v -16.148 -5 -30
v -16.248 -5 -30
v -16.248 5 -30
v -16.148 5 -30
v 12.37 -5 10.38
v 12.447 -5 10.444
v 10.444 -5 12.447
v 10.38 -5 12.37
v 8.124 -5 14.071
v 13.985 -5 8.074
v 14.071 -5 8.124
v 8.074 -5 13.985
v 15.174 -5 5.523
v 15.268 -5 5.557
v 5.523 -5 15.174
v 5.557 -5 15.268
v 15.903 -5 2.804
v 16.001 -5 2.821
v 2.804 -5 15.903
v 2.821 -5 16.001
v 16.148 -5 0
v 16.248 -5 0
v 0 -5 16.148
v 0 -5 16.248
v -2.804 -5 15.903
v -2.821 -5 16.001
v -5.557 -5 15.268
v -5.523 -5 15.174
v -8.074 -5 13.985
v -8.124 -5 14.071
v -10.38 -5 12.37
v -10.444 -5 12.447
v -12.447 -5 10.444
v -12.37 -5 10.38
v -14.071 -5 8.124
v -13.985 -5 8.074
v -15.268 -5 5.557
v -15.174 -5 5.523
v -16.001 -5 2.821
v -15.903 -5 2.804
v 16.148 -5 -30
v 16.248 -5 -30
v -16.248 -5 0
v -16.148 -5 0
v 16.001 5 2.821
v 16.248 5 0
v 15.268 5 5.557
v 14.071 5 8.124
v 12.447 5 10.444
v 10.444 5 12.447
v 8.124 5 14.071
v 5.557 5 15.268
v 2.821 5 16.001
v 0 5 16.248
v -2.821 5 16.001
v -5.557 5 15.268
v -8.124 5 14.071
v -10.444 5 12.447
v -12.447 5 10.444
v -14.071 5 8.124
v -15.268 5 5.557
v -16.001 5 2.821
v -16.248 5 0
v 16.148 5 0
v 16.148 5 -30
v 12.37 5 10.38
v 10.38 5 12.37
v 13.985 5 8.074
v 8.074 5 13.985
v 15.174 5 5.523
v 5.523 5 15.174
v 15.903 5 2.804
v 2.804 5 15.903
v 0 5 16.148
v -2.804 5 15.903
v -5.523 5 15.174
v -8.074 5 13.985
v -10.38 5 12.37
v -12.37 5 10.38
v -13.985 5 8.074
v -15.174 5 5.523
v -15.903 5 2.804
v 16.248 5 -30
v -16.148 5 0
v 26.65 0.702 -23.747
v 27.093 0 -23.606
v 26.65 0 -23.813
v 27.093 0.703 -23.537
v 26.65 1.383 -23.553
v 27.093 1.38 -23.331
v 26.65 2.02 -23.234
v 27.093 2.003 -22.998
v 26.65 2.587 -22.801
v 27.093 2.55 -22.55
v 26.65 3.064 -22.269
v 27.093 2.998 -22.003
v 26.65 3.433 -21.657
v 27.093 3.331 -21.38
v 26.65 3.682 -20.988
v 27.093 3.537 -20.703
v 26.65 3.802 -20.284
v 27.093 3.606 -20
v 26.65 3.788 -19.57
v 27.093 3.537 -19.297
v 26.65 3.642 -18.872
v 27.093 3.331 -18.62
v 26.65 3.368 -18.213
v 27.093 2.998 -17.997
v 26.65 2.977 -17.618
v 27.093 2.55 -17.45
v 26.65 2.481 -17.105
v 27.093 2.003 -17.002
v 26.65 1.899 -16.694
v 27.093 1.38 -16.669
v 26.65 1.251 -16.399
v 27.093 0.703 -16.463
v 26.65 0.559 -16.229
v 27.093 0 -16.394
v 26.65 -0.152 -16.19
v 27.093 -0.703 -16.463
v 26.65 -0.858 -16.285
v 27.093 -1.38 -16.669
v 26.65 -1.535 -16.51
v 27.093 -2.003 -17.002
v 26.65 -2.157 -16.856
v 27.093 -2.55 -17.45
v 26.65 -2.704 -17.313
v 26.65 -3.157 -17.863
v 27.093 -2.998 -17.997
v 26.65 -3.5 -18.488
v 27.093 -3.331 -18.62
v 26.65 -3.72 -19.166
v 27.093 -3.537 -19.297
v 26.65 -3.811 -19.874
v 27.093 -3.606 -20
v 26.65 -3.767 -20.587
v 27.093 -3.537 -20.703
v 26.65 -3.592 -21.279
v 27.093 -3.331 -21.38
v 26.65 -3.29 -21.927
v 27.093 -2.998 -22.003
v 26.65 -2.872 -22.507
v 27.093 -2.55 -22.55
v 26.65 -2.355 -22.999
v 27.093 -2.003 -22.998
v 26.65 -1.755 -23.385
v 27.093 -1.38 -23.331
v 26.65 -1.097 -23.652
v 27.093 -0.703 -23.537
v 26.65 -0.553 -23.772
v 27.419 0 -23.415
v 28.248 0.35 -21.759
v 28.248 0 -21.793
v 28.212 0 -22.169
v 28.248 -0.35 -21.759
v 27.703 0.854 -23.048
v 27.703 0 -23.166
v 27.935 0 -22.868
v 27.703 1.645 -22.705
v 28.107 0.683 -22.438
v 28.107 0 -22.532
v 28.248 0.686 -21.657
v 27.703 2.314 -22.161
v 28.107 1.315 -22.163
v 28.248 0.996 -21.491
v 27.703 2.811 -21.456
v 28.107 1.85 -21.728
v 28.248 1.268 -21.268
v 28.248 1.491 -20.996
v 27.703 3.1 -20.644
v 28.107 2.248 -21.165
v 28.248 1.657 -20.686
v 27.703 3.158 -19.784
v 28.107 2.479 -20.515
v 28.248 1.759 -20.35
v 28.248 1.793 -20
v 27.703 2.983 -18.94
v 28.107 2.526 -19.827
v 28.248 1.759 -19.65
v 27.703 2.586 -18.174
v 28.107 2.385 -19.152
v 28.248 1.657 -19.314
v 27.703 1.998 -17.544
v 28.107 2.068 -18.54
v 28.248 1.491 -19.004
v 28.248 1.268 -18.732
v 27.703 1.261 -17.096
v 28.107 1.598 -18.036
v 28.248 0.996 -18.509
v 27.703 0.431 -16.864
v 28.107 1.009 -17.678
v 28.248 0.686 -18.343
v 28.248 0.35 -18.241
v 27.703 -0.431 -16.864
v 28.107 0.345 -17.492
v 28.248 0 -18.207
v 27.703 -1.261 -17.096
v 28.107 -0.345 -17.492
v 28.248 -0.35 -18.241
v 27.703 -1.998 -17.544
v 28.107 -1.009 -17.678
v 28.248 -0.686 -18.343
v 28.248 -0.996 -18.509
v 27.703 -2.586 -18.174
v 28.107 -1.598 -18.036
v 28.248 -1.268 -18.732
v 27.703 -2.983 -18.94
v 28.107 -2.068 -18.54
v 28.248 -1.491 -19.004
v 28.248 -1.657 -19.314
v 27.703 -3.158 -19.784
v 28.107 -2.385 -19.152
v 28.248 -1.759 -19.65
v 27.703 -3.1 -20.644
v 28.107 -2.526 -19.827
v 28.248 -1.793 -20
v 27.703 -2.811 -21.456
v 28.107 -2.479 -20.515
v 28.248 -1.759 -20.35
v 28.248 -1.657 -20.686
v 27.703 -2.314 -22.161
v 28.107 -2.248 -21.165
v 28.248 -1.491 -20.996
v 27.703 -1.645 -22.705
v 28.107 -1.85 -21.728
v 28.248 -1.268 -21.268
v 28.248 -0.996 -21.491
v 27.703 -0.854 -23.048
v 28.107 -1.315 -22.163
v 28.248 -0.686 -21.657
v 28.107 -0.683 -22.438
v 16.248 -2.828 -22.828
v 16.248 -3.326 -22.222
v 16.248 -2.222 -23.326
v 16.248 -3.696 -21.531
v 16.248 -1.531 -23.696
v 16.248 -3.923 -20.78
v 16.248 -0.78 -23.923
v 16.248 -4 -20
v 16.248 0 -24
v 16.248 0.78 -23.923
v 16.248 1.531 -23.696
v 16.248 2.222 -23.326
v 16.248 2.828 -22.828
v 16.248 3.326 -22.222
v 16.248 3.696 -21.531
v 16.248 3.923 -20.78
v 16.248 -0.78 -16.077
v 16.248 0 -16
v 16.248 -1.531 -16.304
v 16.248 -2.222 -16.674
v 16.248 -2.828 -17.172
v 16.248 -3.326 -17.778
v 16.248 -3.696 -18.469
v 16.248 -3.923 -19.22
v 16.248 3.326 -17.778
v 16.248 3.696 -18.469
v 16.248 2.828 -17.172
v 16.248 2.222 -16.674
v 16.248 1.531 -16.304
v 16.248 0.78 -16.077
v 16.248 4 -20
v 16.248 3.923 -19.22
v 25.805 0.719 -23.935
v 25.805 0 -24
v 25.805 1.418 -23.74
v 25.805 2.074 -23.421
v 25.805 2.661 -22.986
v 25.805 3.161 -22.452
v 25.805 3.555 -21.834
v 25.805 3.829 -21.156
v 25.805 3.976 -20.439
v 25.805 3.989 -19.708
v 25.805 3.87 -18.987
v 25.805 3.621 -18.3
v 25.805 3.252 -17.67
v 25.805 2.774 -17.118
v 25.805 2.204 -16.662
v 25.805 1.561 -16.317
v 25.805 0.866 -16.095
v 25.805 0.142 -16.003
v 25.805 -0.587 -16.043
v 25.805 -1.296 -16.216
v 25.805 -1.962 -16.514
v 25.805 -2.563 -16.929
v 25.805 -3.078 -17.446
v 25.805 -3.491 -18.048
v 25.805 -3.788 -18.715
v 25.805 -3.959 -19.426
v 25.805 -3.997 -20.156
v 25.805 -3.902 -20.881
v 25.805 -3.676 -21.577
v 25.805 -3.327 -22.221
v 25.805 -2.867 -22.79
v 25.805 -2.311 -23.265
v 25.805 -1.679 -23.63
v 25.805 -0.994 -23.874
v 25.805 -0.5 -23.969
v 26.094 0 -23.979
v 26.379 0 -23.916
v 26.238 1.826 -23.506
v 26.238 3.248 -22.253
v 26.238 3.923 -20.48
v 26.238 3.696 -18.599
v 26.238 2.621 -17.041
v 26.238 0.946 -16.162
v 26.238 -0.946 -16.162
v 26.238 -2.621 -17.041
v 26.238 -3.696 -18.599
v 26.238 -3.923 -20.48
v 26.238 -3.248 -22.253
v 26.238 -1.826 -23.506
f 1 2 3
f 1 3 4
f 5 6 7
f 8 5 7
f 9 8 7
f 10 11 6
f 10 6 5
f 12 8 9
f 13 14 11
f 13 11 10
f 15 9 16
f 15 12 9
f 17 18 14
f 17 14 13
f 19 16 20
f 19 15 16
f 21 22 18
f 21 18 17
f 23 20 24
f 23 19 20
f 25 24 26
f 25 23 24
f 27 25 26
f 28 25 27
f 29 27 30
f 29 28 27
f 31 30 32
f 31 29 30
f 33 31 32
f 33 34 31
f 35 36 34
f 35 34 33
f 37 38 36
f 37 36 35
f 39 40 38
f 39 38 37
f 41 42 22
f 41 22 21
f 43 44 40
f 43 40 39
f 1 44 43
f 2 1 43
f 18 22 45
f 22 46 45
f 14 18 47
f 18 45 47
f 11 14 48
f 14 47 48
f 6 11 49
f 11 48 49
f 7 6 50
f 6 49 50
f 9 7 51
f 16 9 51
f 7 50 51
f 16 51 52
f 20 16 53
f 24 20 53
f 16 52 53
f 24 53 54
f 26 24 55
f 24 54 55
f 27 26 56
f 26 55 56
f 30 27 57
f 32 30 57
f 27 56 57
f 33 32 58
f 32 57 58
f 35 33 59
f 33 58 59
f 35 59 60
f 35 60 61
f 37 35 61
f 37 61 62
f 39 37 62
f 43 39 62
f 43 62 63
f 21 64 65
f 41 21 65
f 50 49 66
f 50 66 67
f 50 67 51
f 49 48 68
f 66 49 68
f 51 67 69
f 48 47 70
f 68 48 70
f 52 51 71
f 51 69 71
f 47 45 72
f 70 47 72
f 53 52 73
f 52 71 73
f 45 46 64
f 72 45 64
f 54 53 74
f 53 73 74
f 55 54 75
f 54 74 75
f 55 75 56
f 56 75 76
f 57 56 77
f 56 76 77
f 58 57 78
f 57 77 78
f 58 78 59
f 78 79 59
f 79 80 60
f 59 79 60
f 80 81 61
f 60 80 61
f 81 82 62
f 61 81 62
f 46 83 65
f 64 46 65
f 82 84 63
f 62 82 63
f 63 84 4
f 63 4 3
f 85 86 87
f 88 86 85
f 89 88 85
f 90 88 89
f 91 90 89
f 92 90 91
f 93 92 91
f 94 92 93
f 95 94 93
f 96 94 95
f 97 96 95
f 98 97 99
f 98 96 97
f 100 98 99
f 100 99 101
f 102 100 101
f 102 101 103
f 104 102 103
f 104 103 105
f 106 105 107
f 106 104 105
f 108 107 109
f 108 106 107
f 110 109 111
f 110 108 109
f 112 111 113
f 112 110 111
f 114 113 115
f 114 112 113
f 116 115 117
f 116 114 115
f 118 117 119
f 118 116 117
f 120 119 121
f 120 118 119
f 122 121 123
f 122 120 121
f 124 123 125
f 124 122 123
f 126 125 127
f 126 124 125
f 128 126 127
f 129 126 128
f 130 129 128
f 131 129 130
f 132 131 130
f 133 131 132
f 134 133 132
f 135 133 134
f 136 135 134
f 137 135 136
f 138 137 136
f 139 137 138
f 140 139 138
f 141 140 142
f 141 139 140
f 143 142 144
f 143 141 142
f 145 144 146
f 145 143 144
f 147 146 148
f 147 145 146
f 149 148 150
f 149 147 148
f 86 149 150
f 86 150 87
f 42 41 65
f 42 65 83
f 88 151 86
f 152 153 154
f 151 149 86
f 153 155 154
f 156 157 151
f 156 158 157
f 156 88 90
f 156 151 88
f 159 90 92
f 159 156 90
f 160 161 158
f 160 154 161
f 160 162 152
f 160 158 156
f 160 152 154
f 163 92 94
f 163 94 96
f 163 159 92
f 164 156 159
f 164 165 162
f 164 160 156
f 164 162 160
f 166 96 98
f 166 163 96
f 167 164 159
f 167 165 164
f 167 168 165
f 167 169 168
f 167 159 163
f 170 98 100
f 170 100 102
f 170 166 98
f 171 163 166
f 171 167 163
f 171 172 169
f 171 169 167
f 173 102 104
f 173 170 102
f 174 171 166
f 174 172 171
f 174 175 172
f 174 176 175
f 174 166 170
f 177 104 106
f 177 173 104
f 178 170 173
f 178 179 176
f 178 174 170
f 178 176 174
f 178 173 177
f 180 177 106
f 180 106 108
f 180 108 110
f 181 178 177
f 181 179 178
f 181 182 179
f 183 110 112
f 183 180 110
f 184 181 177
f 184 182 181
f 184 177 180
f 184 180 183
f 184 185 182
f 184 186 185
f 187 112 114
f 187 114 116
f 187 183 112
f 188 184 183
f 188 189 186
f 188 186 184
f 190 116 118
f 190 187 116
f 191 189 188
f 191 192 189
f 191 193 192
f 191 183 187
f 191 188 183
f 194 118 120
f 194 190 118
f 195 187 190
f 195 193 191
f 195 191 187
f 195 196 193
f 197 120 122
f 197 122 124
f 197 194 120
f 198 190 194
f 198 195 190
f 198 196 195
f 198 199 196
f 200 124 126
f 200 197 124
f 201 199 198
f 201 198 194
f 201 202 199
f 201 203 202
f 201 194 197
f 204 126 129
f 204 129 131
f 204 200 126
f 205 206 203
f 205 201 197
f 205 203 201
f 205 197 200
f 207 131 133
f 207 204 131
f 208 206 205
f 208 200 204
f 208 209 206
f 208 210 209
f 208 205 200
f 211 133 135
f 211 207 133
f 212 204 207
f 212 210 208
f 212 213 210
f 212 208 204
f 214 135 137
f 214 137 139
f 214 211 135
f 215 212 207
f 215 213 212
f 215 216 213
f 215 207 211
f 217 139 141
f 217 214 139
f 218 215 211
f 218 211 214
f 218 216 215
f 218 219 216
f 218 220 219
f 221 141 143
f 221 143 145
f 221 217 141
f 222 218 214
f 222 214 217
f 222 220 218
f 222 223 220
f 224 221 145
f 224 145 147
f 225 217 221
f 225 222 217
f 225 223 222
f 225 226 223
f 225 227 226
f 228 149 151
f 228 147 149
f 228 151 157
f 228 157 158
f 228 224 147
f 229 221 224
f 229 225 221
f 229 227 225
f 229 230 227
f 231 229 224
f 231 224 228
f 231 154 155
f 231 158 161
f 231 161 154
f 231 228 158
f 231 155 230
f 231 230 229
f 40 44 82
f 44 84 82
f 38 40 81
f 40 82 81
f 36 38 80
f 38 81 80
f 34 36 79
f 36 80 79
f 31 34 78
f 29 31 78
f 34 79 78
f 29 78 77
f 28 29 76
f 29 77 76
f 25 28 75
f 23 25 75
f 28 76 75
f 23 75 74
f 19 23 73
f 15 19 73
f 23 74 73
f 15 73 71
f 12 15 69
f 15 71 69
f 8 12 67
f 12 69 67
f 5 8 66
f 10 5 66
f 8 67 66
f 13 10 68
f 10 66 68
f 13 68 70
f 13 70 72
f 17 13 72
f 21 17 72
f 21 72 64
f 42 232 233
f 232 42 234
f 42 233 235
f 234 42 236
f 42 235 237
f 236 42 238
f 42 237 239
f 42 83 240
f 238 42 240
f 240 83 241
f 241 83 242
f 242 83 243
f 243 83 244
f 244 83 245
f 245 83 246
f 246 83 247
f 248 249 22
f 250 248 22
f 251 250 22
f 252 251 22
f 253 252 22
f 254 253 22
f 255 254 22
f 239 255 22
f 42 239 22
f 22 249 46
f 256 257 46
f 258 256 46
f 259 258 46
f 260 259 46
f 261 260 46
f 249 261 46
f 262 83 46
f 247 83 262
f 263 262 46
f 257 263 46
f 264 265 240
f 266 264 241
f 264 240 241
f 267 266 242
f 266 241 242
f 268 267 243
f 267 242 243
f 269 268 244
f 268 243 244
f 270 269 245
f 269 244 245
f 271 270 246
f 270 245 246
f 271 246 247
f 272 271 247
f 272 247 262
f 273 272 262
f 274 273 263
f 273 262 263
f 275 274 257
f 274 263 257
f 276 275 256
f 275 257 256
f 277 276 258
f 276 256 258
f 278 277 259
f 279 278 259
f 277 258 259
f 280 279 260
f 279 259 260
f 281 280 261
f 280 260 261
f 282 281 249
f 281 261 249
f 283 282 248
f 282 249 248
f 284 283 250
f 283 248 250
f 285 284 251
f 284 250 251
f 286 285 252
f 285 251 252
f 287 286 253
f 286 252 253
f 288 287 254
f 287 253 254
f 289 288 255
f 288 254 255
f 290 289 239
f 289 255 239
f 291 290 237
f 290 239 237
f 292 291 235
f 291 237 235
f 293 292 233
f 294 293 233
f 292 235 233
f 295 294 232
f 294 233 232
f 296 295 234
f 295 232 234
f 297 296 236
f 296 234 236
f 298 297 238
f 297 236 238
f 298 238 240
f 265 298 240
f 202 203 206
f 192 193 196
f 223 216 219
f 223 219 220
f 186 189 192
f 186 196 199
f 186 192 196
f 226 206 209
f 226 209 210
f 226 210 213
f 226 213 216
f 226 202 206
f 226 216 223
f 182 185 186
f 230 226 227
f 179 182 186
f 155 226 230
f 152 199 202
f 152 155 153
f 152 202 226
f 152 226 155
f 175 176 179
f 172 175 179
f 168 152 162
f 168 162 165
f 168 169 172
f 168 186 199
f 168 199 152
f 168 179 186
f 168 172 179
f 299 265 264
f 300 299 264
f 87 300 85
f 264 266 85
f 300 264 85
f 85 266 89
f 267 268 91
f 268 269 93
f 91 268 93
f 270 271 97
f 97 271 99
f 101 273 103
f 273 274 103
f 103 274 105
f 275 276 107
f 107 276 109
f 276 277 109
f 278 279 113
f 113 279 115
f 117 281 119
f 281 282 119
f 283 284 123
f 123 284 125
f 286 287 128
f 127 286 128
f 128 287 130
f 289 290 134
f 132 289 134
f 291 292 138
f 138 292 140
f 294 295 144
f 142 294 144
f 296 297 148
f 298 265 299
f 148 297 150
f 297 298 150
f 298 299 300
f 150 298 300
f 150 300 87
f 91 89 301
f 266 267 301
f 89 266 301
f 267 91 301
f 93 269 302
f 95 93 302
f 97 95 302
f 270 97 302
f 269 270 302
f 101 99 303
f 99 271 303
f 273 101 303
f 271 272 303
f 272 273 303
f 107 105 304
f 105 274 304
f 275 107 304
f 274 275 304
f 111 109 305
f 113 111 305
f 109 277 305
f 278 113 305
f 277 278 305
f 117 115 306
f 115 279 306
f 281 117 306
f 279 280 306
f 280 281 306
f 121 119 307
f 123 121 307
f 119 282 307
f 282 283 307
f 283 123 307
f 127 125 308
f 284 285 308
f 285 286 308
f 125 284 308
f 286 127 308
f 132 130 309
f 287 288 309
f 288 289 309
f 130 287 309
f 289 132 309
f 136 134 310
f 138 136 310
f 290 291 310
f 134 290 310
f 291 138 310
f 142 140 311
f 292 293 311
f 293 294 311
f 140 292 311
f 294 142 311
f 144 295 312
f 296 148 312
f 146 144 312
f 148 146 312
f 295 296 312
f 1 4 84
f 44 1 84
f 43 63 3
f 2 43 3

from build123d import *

# Parameters (mm, degrees)
EXTRUDE_THIN1_DEPTH = 5
SKETCH5_W           = 26.389754353
SKETCH5_H           = 10
BOSS_EXTRUDE1_DEPTH = 0.1
SKETCH6_R           = 4
BOSS_EXTRUDE2_DEPTH = 12
CHAMFER1_SIZE       = 2
CHAMFER1_SIZE2      = 0.932615316
FILLET1_R           = 2


with BuildPart() as part:
    # Sketch3 → Extrude-Thin1 (new body, symmetric)
    with BuildSketch(Plane(origin=(0, 0, 0), x_dir=(1, 0, 0), z_dir=(0, 1, 0))):
        with BuildLine():
            Line((16.248076809, 30), (16.248076809, 0))
            ThreePointArc((16.248076809, 0), (0, -16.248076809), (-16.248076809, 0))
            Line((-16.248076809, 0), (-16.248076809, 30))
            Line((-16.248076809, 30), (-16.148076809, 30))
            Line((-16.148076809, 30), (-16.148076809, 0))
            ThreePointArc((-16.148076809, 0), (0, -16.148076809), (16.148076809, 0))
            Line((16.148076809, 0), (16.148076809, 30))
            Line((16.148076809, 30), (16.248076809, 30))
        make_face()
    extrude(amount=EXTRUDE_THIN1_DEPTH, both=True)

    # Sketch5 → Boss-Extrude1 (add)
    with BuildSketch(Plane.ZY.offset(16.248076809)):
        with Locations((-13.194877177, 0)):
            Rectangle(SKETCH5_W, SKETCH5_H)
    extrude(amount=-BOSS_EXTRUDE1_DEPTH)

    # Sketch6 → Boss-Extrude2 (add)
    with BuildSketch(Plane(origin=(16.248076809, 0, 0), x_dir=(0, 0, -1), z_dir=(1, 0, 0))):
        with Locations((20, 0)):
            Circle(SKETCH6_R)
    extrude(amount=BOSS_EXTRUDE2_DEPTH)

    # Chamfer1
    chamfer1_edges = [part.edges().sort_by_distance(p)[0] for p in [
        (28.248076809, 0, -16),
    ]]
    chamfer1_side = [part.faces().sort_by_distance(p)[0] for p in [
        (22.248076809, 0, -16),
    ]]
    chamfer(chamfer1_edges, length=CHAMFER1_SIZE, length2=CHAMFER1_SIZE2, reference=chamfer1_side[0])

    # Fillet1
    fillet1_edges = [part.edges().sort_by_distance(p)[0] for p in [
        (28.248076809, 0, -16.932615316),
        (26.248076809, 0, -16),
    ]]
    fillet(fillet1_edges, radius=FILLET1_R)


solid = part.part
